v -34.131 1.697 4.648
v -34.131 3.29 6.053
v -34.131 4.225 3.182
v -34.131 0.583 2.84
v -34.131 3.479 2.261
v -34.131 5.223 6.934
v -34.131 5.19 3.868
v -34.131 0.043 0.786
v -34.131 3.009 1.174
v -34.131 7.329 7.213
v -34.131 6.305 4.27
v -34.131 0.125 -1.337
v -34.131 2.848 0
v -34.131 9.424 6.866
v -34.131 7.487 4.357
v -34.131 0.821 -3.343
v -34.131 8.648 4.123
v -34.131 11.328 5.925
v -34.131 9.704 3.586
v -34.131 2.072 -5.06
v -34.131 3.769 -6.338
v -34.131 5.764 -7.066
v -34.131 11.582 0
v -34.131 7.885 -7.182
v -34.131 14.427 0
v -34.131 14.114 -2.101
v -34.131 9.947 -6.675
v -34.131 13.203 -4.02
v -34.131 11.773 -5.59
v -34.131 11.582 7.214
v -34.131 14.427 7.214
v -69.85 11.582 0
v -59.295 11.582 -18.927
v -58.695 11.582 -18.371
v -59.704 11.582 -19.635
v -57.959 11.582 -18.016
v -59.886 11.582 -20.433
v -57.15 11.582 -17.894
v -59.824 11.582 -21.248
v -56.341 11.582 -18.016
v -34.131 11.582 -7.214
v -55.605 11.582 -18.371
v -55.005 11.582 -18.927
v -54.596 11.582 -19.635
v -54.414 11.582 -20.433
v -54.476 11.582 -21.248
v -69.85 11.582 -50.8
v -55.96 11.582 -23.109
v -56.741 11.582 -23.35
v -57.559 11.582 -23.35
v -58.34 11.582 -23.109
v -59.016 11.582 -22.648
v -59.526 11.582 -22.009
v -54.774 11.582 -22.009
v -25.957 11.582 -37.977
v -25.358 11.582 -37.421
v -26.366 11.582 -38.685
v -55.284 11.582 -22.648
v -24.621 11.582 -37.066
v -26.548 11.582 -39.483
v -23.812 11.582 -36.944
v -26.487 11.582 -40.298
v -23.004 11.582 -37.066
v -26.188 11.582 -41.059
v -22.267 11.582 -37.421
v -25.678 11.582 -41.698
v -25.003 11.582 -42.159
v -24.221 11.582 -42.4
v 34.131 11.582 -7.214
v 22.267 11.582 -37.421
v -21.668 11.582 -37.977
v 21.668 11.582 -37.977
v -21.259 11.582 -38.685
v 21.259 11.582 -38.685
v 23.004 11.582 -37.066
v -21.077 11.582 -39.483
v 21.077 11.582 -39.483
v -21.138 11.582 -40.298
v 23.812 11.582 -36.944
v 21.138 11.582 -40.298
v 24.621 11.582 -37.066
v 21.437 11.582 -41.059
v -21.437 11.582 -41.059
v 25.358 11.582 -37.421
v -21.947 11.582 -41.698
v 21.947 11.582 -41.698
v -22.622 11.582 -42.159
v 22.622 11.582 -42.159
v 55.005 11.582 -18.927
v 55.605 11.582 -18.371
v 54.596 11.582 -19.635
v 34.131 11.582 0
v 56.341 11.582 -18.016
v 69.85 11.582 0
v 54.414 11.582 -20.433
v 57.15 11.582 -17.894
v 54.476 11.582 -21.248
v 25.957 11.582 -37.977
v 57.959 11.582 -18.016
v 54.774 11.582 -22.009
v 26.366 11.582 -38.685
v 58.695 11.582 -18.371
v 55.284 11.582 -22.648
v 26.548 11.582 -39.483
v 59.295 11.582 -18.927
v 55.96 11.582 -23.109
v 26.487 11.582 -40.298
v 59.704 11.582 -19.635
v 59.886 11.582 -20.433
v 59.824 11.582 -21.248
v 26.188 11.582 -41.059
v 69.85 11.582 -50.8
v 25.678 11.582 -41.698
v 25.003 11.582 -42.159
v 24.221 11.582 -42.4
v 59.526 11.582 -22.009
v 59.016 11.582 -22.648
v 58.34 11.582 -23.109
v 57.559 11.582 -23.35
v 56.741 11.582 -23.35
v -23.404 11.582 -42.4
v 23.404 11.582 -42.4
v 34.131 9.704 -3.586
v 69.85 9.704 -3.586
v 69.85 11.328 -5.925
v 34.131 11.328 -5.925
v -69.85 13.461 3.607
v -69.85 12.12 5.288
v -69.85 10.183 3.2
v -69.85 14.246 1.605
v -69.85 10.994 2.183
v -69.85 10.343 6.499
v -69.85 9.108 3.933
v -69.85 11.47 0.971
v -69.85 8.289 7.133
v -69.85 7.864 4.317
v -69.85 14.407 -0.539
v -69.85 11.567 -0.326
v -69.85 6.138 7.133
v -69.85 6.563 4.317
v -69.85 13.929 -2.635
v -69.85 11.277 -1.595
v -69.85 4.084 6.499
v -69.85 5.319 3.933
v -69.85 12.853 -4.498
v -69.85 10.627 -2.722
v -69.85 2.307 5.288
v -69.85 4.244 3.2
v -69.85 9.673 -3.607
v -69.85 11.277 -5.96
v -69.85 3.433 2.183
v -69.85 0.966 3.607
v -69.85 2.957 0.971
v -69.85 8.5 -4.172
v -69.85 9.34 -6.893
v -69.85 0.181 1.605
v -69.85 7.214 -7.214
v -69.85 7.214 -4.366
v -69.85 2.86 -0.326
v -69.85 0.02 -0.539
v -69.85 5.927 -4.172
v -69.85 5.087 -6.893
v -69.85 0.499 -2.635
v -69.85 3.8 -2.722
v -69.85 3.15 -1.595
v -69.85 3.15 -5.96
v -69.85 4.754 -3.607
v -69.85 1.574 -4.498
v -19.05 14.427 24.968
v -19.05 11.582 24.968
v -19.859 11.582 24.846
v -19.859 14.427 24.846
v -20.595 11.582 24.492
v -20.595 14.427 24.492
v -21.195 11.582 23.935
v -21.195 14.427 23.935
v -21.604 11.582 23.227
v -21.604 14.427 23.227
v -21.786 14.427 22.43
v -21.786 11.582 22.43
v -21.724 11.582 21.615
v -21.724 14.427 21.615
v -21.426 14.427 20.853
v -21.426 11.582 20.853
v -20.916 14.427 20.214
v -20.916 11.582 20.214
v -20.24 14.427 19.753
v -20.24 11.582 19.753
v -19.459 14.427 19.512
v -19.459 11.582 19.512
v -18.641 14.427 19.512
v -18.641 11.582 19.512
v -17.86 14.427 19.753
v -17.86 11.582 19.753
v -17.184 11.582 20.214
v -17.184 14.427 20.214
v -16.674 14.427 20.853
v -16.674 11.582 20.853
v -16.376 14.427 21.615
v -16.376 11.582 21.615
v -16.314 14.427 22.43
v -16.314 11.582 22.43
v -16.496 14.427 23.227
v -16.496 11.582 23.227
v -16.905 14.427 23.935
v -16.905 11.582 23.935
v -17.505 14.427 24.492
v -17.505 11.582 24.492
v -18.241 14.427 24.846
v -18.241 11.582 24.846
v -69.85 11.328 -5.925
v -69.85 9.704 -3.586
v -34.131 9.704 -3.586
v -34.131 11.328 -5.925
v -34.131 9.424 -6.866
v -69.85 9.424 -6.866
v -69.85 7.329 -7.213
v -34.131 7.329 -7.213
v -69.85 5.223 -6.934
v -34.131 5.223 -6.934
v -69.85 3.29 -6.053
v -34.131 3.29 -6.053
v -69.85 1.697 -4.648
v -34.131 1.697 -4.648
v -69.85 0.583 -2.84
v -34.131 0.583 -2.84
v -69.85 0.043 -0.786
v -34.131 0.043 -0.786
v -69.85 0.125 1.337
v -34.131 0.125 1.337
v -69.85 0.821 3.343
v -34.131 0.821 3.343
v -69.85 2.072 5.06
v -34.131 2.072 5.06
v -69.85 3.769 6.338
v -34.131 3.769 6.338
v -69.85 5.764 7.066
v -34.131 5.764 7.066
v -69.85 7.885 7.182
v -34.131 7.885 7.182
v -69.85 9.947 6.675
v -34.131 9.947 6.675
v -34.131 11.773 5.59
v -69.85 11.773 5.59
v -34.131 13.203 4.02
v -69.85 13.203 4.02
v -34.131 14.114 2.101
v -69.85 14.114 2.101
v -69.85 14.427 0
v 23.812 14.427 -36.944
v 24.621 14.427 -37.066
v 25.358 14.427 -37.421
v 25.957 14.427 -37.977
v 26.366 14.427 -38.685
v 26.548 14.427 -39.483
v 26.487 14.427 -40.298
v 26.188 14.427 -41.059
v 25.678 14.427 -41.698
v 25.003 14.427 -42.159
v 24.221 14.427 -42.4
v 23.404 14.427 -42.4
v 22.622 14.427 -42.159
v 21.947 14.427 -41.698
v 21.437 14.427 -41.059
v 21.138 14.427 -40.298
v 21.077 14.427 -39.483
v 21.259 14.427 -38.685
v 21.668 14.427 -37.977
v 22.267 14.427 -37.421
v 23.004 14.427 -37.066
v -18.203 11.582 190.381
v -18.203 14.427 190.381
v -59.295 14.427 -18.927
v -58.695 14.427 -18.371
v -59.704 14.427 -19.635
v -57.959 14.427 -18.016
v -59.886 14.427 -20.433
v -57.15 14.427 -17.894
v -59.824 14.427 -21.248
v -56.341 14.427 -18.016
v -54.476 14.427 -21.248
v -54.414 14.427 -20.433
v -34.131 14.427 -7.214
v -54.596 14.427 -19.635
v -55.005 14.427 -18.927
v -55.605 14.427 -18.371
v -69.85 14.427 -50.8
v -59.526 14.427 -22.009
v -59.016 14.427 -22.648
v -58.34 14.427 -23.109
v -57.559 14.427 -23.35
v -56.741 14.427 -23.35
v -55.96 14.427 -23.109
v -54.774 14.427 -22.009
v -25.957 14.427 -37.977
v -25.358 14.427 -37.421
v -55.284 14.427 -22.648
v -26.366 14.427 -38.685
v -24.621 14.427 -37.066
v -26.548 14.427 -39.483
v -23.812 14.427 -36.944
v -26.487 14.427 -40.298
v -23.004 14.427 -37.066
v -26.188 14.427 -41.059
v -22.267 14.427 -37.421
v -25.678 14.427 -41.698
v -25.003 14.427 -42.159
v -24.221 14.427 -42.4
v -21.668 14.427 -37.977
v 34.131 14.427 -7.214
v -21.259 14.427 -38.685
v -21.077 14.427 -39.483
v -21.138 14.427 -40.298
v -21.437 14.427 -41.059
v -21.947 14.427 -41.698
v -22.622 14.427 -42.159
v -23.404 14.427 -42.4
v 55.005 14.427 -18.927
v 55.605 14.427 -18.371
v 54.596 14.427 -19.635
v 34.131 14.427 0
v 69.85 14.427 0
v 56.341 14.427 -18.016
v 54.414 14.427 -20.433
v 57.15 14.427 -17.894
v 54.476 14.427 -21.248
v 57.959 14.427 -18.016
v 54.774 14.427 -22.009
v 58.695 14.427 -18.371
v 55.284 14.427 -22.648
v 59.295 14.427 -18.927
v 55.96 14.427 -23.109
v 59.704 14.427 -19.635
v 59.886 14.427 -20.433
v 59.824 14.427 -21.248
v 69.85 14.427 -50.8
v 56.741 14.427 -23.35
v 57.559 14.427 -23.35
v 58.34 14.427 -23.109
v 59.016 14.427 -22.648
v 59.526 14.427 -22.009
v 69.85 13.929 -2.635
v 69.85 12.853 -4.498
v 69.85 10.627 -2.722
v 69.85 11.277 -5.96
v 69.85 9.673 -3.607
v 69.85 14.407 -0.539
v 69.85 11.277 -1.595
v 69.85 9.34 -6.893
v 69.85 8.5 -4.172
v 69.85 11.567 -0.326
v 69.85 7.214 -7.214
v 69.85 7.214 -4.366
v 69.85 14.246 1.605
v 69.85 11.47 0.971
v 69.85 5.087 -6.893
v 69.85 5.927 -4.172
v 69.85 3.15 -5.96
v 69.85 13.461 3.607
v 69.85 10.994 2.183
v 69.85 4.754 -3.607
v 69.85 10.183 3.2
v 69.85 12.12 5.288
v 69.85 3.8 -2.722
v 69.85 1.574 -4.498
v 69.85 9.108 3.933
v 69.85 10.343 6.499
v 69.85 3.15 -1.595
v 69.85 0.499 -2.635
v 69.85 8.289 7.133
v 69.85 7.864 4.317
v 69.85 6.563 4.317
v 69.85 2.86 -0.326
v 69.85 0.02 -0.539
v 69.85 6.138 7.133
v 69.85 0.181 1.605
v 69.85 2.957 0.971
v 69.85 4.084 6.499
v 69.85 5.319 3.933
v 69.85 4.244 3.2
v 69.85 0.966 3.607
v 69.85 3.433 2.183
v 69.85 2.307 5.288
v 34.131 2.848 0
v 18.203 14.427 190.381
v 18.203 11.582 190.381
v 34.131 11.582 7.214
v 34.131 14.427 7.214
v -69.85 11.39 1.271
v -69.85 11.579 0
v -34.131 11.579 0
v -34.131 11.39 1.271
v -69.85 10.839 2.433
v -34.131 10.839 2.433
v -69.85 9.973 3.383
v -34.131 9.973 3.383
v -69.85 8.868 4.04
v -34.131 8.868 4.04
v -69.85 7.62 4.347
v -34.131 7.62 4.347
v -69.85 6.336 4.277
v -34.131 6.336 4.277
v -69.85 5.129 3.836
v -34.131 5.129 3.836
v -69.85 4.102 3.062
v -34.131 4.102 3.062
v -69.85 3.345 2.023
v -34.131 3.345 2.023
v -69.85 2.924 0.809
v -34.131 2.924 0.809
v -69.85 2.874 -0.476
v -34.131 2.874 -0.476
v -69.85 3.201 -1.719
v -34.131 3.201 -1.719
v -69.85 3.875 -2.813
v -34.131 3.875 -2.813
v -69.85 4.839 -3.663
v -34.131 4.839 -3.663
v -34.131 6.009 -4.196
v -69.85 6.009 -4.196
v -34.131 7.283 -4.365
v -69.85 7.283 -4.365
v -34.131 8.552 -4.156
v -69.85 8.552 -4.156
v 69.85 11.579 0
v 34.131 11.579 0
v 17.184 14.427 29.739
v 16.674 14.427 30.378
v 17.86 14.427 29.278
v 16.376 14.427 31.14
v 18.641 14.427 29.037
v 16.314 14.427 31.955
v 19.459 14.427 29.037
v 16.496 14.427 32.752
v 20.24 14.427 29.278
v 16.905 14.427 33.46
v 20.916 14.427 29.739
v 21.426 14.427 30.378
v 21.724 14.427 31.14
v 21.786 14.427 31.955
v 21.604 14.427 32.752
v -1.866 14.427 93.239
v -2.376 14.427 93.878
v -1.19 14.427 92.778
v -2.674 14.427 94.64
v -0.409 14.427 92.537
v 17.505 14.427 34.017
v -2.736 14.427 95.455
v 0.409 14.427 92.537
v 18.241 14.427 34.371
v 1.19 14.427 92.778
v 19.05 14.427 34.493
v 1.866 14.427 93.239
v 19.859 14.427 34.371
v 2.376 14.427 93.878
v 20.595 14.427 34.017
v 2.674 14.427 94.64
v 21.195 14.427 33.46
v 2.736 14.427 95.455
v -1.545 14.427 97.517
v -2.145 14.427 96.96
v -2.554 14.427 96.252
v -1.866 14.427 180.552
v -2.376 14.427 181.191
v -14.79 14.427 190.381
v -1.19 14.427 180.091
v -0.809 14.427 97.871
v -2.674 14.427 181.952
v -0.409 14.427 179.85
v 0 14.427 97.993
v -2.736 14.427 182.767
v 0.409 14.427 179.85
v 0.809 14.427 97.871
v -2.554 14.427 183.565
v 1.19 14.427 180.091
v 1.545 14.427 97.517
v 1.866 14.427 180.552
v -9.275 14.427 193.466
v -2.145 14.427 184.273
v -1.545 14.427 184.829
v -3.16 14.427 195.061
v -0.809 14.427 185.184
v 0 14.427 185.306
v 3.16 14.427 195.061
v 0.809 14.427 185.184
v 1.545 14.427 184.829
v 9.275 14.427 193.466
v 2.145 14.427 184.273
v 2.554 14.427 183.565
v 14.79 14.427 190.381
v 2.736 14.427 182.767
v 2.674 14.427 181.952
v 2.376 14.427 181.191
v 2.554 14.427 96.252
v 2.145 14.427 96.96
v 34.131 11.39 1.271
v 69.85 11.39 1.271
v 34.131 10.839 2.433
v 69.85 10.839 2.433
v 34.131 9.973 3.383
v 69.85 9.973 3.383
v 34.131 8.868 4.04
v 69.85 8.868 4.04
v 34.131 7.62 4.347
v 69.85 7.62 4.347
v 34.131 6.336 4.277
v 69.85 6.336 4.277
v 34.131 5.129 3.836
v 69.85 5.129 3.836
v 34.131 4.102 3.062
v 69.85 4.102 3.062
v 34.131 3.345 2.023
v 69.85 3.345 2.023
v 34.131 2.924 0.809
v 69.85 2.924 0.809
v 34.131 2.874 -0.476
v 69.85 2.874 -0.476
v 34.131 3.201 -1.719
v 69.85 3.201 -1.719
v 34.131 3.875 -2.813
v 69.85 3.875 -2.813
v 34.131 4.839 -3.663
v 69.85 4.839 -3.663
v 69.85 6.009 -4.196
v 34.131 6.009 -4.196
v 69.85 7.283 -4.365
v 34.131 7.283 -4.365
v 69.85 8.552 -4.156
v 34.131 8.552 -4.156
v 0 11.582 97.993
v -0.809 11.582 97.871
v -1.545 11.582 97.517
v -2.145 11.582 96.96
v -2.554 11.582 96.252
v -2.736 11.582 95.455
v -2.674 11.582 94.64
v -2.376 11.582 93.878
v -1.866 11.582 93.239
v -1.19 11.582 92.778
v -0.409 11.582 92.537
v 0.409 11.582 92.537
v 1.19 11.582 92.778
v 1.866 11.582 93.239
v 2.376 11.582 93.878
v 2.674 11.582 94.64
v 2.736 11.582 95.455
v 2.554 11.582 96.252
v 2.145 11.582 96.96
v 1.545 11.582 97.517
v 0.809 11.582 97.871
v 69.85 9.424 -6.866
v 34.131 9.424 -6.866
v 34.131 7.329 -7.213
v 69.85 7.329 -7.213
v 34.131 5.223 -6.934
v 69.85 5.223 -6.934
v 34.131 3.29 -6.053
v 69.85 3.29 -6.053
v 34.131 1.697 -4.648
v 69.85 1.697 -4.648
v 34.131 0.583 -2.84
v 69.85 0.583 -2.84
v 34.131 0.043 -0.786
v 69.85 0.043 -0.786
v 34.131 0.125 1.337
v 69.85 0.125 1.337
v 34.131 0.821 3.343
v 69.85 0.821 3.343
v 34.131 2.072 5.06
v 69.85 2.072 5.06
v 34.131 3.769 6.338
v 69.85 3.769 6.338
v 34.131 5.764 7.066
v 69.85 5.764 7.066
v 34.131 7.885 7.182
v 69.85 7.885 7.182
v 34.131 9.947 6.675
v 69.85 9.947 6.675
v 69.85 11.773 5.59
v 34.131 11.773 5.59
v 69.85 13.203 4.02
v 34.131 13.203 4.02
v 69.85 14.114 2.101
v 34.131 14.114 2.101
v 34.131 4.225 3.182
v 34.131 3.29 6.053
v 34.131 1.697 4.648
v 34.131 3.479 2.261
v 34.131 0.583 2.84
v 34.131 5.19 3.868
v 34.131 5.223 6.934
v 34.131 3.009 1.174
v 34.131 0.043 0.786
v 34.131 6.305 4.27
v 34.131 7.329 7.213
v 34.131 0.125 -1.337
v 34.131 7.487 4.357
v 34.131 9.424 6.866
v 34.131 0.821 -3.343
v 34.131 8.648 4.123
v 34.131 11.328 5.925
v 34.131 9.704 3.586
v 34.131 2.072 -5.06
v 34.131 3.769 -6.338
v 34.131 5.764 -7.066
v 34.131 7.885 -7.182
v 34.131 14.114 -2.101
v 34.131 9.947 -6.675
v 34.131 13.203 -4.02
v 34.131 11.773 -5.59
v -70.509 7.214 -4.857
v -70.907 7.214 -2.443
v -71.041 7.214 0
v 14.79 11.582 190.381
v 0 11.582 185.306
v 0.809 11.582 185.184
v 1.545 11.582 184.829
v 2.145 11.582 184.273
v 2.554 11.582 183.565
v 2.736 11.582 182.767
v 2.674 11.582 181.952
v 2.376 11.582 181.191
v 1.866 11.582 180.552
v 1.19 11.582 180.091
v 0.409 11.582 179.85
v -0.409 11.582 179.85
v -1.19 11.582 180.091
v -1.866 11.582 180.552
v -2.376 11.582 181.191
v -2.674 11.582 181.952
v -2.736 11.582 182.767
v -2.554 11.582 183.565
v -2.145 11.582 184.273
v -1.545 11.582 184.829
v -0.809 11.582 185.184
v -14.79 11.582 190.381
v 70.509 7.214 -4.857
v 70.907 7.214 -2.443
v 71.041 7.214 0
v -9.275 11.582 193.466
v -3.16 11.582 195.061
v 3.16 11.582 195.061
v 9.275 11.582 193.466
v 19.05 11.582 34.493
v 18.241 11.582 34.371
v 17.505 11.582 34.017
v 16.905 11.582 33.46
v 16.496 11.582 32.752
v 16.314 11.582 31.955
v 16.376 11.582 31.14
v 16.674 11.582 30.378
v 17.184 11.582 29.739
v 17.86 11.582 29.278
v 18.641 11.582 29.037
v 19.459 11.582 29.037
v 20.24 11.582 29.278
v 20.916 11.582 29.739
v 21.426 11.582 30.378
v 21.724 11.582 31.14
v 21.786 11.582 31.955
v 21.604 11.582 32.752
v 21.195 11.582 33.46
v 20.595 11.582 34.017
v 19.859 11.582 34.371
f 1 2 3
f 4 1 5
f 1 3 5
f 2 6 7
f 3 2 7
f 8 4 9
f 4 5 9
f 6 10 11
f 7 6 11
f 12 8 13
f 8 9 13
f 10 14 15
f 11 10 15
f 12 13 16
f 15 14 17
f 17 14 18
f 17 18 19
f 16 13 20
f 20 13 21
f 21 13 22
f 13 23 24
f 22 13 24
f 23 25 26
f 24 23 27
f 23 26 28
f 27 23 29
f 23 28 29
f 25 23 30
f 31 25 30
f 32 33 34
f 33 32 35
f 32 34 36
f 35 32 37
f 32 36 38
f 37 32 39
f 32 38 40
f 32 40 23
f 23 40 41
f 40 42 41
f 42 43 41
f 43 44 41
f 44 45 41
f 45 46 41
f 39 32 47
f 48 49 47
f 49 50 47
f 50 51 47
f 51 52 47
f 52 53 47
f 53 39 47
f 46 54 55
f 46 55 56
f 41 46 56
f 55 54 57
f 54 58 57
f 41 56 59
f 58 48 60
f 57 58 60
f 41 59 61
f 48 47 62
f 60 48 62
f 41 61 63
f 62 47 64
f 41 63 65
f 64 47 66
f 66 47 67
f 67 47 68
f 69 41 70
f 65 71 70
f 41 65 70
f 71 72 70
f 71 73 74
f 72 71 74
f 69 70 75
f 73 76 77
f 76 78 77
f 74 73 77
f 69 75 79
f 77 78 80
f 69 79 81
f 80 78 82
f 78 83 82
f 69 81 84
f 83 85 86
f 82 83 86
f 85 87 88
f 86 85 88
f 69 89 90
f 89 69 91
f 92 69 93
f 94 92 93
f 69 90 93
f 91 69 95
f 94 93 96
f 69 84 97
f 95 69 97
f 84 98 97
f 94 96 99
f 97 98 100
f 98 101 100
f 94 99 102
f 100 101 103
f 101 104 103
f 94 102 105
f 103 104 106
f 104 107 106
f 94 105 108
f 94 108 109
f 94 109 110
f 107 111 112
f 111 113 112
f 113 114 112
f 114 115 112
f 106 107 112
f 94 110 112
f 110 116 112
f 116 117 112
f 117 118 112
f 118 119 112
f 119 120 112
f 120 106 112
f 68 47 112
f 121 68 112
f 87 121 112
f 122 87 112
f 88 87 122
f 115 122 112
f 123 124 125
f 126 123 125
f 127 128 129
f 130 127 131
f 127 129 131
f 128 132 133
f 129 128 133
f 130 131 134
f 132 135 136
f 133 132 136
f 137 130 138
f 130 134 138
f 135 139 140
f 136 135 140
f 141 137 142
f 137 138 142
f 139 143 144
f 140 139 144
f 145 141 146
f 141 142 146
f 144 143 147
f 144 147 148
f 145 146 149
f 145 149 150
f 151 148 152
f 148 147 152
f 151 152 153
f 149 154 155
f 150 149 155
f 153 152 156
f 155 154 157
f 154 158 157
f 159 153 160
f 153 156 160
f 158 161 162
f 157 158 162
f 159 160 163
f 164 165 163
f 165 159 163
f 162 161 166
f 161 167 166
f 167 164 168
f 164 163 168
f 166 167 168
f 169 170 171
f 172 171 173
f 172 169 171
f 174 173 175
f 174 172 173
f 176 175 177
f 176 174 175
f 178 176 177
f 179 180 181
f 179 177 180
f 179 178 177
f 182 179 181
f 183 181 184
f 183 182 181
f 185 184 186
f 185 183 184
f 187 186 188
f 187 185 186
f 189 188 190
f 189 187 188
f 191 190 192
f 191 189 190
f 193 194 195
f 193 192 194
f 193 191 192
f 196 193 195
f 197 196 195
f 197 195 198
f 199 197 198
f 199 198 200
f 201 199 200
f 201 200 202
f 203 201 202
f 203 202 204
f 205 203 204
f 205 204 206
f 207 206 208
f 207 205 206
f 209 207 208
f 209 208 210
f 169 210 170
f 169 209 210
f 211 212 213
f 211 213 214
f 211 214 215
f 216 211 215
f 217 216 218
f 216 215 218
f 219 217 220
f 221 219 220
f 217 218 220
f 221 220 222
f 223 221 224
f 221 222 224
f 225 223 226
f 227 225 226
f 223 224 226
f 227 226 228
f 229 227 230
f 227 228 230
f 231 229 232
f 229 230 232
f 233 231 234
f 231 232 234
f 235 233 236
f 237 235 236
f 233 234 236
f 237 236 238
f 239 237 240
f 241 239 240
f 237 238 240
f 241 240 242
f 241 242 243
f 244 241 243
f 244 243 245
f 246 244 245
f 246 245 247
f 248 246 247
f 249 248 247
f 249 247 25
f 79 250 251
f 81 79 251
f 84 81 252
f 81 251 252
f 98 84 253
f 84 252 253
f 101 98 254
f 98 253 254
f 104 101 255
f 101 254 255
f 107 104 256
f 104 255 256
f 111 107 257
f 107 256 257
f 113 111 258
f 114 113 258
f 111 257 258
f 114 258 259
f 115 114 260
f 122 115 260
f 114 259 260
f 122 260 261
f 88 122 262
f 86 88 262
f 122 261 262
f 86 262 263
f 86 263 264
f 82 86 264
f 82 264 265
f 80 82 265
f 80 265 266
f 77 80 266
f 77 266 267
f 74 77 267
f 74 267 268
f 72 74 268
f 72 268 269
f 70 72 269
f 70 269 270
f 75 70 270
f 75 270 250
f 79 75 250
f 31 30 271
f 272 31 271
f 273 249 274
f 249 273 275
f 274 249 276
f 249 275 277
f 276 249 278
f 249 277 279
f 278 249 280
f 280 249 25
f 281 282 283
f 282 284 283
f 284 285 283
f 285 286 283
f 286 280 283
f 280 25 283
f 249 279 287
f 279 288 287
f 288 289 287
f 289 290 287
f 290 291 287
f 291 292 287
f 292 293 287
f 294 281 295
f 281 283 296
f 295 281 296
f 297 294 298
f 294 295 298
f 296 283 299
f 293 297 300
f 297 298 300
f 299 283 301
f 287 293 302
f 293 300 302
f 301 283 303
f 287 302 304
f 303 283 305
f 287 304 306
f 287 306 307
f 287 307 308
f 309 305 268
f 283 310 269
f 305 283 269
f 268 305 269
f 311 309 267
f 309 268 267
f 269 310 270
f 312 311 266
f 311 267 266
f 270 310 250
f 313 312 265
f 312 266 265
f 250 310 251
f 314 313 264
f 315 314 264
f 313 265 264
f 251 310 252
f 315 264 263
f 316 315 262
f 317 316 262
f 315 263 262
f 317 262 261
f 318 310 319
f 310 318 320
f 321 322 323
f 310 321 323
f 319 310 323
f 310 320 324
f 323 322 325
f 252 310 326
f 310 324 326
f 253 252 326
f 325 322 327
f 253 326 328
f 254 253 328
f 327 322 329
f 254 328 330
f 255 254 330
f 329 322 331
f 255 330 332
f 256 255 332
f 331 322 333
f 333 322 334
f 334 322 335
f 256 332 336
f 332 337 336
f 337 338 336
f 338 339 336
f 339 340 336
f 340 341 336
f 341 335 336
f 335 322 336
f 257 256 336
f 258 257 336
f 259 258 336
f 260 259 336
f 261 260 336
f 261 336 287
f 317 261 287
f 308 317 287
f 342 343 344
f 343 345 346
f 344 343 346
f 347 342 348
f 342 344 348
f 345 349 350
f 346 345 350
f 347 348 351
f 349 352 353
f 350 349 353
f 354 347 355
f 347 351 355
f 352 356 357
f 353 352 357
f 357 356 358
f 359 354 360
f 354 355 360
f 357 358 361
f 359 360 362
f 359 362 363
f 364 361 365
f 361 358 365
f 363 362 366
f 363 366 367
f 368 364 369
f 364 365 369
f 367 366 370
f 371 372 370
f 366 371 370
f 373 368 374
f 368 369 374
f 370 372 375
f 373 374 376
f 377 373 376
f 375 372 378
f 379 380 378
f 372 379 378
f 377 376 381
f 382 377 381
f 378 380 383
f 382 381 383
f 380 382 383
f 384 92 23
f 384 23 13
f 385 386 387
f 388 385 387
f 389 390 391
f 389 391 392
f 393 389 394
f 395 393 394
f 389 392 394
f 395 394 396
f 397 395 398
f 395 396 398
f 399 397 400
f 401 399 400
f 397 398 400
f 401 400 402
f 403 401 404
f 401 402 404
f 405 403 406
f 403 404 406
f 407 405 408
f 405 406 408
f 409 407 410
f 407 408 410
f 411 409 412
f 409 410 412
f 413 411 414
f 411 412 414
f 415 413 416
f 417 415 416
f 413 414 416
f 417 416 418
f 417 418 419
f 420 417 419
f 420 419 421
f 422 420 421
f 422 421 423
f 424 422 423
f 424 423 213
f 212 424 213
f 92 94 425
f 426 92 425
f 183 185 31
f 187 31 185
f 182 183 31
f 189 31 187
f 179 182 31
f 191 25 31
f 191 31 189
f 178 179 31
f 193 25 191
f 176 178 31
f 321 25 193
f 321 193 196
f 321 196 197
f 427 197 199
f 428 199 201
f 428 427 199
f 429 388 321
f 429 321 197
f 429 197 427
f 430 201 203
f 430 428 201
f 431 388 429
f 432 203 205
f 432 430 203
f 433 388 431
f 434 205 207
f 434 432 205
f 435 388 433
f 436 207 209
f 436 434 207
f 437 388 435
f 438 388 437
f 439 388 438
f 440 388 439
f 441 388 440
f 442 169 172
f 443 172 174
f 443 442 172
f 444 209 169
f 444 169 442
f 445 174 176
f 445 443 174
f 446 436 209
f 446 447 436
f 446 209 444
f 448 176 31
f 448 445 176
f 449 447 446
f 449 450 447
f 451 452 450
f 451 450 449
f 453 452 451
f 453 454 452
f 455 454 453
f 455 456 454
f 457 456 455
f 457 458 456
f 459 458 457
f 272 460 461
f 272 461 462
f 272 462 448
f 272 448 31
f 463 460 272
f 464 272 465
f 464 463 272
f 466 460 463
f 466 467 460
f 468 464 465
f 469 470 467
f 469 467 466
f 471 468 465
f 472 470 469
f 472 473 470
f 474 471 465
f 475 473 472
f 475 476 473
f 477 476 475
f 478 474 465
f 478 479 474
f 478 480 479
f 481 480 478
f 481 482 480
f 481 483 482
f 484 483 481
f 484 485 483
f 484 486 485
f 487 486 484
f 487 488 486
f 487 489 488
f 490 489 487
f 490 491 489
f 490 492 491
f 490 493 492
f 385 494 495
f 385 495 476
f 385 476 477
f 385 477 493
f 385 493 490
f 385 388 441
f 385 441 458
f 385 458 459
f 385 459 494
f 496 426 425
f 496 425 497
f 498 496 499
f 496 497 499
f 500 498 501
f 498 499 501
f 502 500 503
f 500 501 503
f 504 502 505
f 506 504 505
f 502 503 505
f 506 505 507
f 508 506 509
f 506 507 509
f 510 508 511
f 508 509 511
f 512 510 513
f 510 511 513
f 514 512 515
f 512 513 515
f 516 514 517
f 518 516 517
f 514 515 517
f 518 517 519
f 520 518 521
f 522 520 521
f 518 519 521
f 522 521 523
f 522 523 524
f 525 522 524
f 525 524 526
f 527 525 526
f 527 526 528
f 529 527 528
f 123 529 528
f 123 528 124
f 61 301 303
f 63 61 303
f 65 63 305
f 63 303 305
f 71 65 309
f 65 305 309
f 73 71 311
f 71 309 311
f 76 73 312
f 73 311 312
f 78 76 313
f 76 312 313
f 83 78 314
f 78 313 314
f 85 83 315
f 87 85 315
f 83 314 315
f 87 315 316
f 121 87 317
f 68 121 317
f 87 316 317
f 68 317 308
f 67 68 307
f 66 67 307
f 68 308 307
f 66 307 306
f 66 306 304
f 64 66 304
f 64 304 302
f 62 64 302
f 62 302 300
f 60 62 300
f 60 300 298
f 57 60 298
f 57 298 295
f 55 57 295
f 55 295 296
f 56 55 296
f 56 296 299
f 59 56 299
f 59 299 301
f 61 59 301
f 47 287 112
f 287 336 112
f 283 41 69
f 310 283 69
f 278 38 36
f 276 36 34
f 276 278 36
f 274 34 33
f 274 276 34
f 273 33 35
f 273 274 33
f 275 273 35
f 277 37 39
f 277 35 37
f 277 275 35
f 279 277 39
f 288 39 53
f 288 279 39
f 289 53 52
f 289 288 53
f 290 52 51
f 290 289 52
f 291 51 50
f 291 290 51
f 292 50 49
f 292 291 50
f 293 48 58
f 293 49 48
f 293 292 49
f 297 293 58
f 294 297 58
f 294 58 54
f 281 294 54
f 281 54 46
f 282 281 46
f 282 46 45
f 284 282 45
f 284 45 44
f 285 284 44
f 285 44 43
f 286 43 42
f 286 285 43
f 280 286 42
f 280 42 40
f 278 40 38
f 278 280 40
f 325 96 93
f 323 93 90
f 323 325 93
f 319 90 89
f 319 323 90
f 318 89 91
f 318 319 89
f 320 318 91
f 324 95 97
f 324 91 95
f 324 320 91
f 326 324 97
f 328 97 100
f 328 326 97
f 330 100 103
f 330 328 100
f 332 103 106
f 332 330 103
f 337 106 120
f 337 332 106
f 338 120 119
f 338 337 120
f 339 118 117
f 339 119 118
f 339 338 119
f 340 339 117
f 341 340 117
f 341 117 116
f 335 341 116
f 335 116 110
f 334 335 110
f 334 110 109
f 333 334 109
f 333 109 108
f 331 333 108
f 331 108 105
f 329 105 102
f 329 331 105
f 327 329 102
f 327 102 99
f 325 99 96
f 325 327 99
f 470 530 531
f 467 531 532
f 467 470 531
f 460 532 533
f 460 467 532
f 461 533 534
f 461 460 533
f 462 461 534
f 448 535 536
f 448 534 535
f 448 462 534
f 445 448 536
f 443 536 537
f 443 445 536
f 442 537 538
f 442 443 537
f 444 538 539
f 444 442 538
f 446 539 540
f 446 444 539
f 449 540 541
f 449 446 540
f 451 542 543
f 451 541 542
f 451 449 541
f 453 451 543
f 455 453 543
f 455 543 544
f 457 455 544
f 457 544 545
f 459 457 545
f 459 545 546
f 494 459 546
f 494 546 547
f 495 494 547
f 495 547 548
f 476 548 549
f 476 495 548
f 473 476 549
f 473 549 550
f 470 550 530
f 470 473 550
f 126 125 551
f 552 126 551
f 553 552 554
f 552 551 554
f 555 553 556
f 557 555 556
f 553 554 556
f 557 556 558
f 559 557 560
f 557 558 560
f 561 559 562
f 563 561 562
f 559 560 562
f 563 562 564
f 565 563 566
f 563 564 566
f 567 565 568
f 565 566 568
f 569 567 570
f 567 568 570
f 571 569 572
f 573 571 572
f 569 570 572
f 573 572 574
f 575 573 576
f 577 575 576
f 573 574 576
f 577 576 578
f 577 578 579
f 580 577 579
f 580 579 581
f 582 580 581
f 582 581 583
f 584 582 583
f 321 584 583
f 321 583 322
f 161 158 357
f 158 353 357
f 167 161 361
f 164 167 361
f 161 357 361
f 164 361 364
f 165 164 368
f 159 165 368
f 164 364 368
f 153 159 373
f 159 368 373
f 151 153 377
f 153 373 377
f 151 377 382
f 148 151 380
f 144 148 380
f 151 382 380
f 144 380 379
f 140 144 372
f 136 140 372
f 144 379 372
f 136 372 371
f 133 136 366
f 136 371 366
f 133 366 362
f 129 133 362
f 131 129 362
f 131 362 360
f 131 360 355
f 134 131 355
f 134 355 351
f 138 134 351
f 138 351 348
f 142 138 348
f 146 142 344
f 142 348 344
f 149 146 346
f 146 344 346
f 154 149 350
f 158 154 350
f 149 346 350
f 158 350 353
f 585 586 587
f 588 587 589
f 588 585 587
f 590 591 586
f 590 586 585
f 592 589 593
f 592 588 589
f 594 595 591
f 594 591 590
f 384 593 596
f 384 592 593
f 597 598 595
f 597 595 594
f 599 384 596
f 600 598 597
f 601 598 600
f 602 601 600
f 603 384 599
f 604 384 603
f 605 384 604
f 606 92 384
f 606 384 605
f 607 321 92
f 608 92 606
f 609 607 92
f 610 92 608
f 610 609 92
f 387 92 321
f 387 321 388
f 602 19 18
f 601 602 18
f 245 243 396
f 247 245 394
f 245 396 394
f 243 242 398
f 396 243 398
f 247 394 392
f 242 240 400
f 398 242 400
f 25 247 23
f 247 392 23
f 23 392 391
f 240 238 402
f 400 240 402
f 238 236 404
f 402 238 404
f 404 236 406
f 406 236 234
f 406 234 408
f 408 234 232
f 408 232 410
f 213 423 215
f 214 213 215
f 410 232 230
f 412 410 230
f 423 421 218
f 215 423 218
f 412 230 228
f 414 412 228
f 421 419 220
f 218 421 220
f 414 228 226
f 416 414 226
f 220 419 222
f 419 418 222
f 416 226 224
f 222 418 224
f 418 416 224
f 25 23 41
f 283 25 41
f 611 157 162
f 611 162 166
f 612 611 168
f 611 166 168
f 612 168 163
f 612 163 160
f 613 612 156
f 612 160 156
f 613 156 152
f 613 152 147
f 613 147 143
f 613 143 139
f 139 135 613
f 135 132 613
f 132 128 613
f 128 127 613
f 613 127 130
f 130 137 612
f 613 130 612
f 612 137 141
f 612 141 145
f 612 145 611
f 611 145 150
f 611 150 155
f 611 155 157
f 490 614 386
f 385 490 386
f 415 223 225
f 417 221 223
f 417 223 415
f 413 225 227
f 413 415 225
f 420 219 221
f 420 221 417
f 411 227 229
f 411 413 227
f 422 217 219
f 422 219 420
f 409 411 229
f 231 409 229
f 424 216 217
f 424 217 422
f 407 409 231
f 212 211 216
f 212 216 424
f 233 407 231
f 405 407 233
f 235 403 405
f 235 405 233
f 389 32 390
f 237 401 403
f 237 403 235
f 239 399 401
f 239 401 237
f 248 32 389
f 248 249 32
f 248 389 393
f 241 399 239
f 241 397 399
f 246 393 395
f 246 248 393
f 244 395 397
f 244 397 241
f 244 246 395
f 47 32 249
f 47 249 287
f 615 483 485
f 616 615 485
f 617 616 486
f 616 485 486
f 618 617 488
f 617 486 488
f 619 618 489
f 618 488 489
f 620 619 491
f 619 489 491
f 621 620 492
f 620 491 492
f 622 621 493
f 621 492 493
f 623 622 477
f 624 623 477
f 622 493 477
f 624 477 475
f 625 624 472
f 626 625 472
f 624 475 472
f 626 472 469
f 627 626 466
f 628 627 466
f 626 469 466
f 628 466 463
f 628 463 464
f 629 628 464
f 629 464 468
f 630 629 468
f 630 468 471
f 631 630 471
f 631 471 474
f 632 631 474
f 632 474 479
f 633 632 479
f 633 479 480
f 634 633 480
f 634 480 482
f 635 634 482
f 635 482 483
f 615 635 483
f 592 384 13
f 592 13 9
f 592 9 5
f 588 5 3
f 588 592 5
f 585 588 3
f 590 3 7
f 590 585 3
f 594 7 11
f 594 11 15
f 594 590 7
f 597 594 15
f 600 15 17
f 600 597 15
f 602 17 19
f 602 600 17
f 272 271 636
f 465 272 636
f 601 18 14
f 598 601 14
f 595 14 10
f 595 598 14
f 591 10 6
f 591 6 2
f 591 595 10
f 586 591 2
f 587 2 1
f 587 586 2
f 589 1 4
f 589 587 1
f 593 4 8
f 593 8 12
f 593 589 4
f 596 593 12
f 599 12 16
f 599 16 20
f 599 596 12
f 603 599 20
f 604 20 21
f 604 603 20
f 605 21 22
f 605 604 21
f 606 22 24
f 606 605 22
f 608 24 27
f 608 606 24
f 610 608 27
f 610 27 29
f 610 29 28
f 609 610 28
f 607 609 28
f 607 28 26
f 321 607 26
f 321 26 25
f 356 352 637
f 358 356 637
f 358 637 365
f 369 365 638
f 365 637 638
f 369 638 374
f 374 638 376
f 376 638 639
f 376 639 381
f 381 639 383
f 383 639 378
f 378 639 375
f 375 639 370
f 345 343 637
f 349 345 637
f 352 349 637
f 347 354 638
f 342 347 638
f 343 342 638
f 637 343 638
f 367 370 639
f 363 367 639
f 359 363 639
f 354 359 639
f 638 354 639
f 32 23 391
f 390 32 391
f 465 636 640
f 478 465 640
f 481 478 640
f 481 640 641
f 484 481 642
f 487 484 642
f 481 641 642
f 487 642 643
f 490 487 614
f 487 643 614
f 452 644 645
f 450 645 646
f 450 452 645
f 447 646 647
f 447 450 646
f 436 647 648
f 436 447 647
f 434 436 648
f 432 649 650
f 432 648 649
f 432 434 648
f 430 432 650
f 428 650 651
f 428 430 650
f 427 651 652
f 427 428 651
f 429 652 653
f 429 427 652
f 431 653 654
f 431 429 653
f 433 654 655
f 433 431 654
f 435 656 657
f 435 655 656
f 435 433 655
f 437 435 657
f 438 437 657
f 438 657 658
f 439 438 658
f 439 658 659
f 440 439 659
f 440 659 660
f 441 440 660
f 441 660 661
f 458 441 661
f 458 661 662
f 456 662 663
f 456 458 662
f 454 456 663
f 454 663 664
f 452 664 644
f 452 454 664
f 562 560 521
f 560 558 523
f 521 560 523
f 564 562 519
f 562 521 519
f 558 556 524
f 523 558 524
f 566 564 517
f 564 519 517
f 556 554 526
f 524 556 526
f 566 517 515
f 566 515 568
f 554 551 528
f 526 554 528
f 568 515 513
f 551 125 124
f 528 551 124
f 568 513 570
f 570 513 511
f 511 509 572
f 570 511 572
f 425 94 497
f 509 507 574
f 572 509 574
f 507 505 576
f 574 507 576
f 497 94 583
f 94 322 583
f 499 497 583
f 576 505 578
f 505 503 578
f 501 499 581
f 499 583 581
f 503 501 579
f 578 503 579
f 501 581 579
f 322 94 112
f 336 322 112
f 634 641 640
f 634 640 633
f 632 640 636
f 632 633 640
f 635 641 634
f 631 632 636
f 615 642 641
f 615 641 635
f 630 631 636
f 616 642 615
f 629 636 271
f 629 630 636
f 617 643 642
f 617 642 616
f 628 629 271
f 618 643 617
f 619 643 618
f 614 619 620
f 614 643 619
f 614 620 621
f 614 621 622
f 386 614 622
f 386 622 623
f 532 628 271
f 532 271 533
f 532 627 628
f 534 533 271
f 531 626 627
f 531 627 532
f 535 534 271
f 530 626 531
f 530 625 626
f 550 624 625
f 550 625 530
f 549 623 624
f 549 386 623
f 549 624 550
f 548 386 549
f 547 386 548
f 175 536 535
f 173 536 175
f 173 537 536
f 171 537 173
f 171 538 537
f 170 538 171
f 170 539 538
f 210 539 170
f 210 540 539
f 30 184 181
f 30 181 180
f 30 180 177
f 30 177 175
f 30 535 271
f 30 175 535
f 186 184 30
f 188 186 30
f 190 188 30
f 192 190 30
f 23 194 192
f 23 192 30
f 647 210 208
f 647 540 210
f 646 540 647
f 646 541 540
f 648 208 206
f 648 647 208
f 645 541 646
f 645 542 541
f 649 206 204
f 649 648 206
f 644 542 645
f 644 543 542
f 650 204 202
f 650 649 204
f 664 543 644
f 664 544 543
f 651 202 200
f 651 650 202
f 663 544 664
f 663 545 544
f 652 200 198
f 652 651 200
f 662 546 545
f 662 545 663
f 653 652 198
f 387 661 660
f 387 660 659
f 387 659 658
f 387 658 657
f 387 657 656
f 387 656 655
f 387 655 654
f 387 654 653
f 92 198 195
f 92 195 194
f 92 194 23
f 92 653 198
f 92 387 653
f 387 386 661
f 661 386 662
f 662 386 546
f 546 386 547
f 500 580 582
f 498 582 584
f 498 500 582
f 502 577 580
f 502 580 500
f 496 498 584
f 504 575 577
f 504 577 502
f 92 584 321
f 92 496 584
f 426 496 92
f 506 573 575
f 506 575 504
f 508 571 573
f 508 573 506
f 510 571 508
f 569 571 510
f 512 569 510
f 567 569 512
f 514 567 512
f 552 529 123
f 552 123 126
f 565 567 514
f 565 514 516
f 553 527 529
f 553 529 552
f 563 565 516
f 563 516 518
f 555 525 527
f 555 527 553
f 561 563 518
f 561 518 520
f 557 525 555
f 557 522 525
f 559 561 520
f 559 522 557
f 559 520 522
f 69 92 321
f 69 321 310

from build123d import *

# Parameters (mm, degrees)
EXTRUDE1_DEPTH        = 34.13125
EXTRUDE2_DEPTH        = 69.85
SKETCH6_W             = 68.2625
SKETCH6_H             = 14.4272
CUT_EXTRUDE3_DEPTH    = 208.881241352
CUT_EXTRUDE4_DEPTH    = 1056.132
A24_HOLES_R           = 2.7432
A24_HOLE_CUT_DEPTH    = 209.284321077
SKETCH10_R            = 2.7432
EXTRUDE3_DEPTH        = 209.284321077
SKETCH12_R            = 2.7432
EXTRUDE5_DEPTH        = 209.284321077
DELETEFACE1_START     = 11.5824
DELETEFACE1_OUTLINE_R = 2.7432
DELETEFACE1_DEPTH     = 2.8448


# Read off the part's stored shape, not the designer's step: DeleteFace1
with BuildPart() as part:
    # Sketch2 → Extrude1 (new, symmetric)
    with BuildSketch(Plane(origin=(0, 0, 0), x_dir=(0, 0, -1), z_dir=(1, 0, 0))):
        with BuildLine():
            Line((0, 14.4272), (-195.2625, 14.4272))
            Line((-195.2625, 14.4272), (-195.2625, 11.5824))
            Line((-195.2625, 11.5824), (0, 11.5824))
            Line((0, 11.5824), (0, 2.847975))
            ThreePointArc((0, 2.847975), (-3.868474062, 5.190337765), (-3.58571223, 9.70385088))
            Line((-3.58571223, 9.70385088), (-5.924900499, 11.3284))
            ThreePointArc((-5.924900499, 11.3284), (3.343164944, 0.821474131), (0, 14.4272))
        make_face()
    extrude(amount=EXTRUDE1_DEPTH, both=True)

    # Sketch8 → Cut-Extrude4 (cut)
    with BuildSketch(Plane.XZ.offset(-11.5824)):
        with BuildLine():
            Line((-18.203333333, 190.3809375), (-14.790208333, 190.3809375))
            ThreePointArc((-14.790208333, 190.3809375), (0, 195.2625), (14.790208333, 190.3809375))
            Line((14.790208333, 190.3809375), (18.203333333, 190.3809375))
            Line((18.203333333, 190.3809375), (34.13125, 7.2136))
            Line((34.13125, 7.2136), (73.025, 7.2136))
            Line((73.025, 7.2136), (73.025, 220.6625))
            Line((73.025, 220.6625), (-73.025, 220.6625))
            Line((-73.025, 220.6625), (-73.025, 7.2136))
            Line((-73.025, 7.2136), (-34.13125, 7.2136))
            Line((-34.13125, 7.2136), (-18.203333333, 190.3809375))
        make_face()
    extrude(amount=-CUT_EXTRUDE4_DEPTH, mode=Mode.SUBTRACT)


with BuildPart() as body_2:
    # Sketch4 → Extrude2 (new, symmetric)
    with BuildSketch(Plane(origin=(0, 0, 0), x_dir=(0, 0, -1), z_dir=(1, 0, 0))):
        with BuildLine():
            Line((0, 14.4272), (50.8, 14.4272))
            Line((50.8, 14.4272), (50.8, 11.5824))
            Line((50.8, 11.5824), (0, 11.5824))
            Line((0, 11.5824), (0, 11.579225))
            ThreePointArc((0, 11.579225), (-2.023262235, 3.345125938), (3.58571223, 9.70385088))
            Line((3.58571223, 9.70385088), (5.924900499, 11.3284))
            ThreePointArc((5.924900499, 11.3284), (-3.343164944, 0.821474131), (0, 14.4272))
        make_face()
    extrude(amount=EXTRUDE2_DEPTH, both=True)

    # Sketch6 → Cut-Extrude3 (cut, through all)
    with BuildSketch(Plane(origin=(0, 0, 0), x_dir=(1, 0, 0), z_dir=(0, 1, 0))):
        Rectangle(SKETCH6_W, SKETCH6_H)
    extrude(amount=CUT_EXTRUDE3_DEPTH, mode=Mode.SUBTRACT)


with BuildPart() as body_3:
    # Sketch7 → Revolve1 (revolve)
    with BuildSketch(Plane(origin=(0, 7.2136, 0), x_dir=(-1, 0, 0), z_dir=(0, 1, 0))):
        with BuildLine():
            Line((-71.040625, 0), (71.040625, 0))
            ThreePointArc((71.040625, 0), (70.740968682, -3.655598886), (69.85, -7.2136))
            Line((69.85, -7.2136), (69.85, -4.365625))
            Line((69.85, -4.365625), (-69.85, -4.365625))
            Line((-69.85, -4.365625), (-69.85, -7.2136))
            ThreePointArc((-69.85, -7.2136), (-70.740968682, -3.655598886), (-71.040625, 0))
        make_face()
    revolve(axis=Axis((71.040625, 7.2136, 0), (-1, 0, 0)))


with BuildPart() as a24_hole_cut_tool:
    # a24 holes → A24 hole cut (new, through all)
    with BuildSketch(Plane.XZ.offset(-14.4272)):
        with Locations(Location((0, 95.25, 0), (0, 0, 90))):
            Circle(A24_HOLES_R)
        with Locations(Location((-19.05, 22.225, 0), (0, 0, 90))):
            Circle(A24_HOLES_R)
        with Locations(Location((19.05, 31.75, 0), (0, 0, 90))):
            Circle(A24_HOLES_R)
        with Locations(Location((0, -39.6875, 0), (0, 0, 90))):
            Circle(A24_HOLES_R)
        with Locations(Location((57.15, -20.6375, 0), (0, 0, 90))):
            Circle(A24_HOLES_R)
        with Locations(Location((-57.15, -20.6375, 0), (0, 0, 90))):
            Circle(A24_HOLES_R)
    extrude(amount=A24_HOLE_CUT_DEPTH)


with BuildPart() as part_1:
    add(part.part)

    # A24 hole cut: cut by a24_hole_cut_tool
    add(a24_hole_cut_tool.part, mode=Mode.SUBTRACT)

    # Sketch10 → Extrude3 (cut, through all)
    with BuildSketch(Plane(origin=(0, 14.4272, 0), x_dir=(1, 0, 0), z_dir=(0, 1, 0))):
        with Locations(Location((0, -182.5625, 0), (0, 0, 270))):
            Circle(SKETCH10_R)
    extrude(amount=-EXTRUDE3_DEPTH, mode=Mode.SUBTRACT)


with BuildPart() as body_2_1:
    add(body_2.part)

    # A24 hole cut: cut by a24_hole_cut_tool
    add(a24_hole_cut_tool.part, mode=Mode.SUBTRACT)

    # Sketch12 → Extrude5 (cut, through all)
    with BuildSketch(Plane(origin=(0, 14.4272, 0), x_dir=(1, 0, 0), z_dir=(0, 1, 0))):
        with Locations(Location((-23.8125, 39.6875, 0), (0, 0, 270))):
            Circle(SKETCH12_R)
        with Locations(Location((23.8125, 39.6875, 0), (0, 0, 270))):
            Circle(SKETCH12_R)
    extrude(amount=-EXTRUDE5_DEPTH, mode=Mode.SUBTRACT)

    # DeleteFace1 outline → DeleteFace1 (add)
    with BuildSketch(Plane(origin=(0, 0, 0), x_dir=(1, 0, 0), z_dir=(0, 1, 0)).offset(DELETEFACE1_START)):
        with Locations((0, 39.6875)):
            Circle(DELETEFACE1_OUTLINE_R)
    extrude(amount=DELETEFACE1_DEPTH)


solid = Compound([body_3.part, part_1.part, body_2_1.part])
